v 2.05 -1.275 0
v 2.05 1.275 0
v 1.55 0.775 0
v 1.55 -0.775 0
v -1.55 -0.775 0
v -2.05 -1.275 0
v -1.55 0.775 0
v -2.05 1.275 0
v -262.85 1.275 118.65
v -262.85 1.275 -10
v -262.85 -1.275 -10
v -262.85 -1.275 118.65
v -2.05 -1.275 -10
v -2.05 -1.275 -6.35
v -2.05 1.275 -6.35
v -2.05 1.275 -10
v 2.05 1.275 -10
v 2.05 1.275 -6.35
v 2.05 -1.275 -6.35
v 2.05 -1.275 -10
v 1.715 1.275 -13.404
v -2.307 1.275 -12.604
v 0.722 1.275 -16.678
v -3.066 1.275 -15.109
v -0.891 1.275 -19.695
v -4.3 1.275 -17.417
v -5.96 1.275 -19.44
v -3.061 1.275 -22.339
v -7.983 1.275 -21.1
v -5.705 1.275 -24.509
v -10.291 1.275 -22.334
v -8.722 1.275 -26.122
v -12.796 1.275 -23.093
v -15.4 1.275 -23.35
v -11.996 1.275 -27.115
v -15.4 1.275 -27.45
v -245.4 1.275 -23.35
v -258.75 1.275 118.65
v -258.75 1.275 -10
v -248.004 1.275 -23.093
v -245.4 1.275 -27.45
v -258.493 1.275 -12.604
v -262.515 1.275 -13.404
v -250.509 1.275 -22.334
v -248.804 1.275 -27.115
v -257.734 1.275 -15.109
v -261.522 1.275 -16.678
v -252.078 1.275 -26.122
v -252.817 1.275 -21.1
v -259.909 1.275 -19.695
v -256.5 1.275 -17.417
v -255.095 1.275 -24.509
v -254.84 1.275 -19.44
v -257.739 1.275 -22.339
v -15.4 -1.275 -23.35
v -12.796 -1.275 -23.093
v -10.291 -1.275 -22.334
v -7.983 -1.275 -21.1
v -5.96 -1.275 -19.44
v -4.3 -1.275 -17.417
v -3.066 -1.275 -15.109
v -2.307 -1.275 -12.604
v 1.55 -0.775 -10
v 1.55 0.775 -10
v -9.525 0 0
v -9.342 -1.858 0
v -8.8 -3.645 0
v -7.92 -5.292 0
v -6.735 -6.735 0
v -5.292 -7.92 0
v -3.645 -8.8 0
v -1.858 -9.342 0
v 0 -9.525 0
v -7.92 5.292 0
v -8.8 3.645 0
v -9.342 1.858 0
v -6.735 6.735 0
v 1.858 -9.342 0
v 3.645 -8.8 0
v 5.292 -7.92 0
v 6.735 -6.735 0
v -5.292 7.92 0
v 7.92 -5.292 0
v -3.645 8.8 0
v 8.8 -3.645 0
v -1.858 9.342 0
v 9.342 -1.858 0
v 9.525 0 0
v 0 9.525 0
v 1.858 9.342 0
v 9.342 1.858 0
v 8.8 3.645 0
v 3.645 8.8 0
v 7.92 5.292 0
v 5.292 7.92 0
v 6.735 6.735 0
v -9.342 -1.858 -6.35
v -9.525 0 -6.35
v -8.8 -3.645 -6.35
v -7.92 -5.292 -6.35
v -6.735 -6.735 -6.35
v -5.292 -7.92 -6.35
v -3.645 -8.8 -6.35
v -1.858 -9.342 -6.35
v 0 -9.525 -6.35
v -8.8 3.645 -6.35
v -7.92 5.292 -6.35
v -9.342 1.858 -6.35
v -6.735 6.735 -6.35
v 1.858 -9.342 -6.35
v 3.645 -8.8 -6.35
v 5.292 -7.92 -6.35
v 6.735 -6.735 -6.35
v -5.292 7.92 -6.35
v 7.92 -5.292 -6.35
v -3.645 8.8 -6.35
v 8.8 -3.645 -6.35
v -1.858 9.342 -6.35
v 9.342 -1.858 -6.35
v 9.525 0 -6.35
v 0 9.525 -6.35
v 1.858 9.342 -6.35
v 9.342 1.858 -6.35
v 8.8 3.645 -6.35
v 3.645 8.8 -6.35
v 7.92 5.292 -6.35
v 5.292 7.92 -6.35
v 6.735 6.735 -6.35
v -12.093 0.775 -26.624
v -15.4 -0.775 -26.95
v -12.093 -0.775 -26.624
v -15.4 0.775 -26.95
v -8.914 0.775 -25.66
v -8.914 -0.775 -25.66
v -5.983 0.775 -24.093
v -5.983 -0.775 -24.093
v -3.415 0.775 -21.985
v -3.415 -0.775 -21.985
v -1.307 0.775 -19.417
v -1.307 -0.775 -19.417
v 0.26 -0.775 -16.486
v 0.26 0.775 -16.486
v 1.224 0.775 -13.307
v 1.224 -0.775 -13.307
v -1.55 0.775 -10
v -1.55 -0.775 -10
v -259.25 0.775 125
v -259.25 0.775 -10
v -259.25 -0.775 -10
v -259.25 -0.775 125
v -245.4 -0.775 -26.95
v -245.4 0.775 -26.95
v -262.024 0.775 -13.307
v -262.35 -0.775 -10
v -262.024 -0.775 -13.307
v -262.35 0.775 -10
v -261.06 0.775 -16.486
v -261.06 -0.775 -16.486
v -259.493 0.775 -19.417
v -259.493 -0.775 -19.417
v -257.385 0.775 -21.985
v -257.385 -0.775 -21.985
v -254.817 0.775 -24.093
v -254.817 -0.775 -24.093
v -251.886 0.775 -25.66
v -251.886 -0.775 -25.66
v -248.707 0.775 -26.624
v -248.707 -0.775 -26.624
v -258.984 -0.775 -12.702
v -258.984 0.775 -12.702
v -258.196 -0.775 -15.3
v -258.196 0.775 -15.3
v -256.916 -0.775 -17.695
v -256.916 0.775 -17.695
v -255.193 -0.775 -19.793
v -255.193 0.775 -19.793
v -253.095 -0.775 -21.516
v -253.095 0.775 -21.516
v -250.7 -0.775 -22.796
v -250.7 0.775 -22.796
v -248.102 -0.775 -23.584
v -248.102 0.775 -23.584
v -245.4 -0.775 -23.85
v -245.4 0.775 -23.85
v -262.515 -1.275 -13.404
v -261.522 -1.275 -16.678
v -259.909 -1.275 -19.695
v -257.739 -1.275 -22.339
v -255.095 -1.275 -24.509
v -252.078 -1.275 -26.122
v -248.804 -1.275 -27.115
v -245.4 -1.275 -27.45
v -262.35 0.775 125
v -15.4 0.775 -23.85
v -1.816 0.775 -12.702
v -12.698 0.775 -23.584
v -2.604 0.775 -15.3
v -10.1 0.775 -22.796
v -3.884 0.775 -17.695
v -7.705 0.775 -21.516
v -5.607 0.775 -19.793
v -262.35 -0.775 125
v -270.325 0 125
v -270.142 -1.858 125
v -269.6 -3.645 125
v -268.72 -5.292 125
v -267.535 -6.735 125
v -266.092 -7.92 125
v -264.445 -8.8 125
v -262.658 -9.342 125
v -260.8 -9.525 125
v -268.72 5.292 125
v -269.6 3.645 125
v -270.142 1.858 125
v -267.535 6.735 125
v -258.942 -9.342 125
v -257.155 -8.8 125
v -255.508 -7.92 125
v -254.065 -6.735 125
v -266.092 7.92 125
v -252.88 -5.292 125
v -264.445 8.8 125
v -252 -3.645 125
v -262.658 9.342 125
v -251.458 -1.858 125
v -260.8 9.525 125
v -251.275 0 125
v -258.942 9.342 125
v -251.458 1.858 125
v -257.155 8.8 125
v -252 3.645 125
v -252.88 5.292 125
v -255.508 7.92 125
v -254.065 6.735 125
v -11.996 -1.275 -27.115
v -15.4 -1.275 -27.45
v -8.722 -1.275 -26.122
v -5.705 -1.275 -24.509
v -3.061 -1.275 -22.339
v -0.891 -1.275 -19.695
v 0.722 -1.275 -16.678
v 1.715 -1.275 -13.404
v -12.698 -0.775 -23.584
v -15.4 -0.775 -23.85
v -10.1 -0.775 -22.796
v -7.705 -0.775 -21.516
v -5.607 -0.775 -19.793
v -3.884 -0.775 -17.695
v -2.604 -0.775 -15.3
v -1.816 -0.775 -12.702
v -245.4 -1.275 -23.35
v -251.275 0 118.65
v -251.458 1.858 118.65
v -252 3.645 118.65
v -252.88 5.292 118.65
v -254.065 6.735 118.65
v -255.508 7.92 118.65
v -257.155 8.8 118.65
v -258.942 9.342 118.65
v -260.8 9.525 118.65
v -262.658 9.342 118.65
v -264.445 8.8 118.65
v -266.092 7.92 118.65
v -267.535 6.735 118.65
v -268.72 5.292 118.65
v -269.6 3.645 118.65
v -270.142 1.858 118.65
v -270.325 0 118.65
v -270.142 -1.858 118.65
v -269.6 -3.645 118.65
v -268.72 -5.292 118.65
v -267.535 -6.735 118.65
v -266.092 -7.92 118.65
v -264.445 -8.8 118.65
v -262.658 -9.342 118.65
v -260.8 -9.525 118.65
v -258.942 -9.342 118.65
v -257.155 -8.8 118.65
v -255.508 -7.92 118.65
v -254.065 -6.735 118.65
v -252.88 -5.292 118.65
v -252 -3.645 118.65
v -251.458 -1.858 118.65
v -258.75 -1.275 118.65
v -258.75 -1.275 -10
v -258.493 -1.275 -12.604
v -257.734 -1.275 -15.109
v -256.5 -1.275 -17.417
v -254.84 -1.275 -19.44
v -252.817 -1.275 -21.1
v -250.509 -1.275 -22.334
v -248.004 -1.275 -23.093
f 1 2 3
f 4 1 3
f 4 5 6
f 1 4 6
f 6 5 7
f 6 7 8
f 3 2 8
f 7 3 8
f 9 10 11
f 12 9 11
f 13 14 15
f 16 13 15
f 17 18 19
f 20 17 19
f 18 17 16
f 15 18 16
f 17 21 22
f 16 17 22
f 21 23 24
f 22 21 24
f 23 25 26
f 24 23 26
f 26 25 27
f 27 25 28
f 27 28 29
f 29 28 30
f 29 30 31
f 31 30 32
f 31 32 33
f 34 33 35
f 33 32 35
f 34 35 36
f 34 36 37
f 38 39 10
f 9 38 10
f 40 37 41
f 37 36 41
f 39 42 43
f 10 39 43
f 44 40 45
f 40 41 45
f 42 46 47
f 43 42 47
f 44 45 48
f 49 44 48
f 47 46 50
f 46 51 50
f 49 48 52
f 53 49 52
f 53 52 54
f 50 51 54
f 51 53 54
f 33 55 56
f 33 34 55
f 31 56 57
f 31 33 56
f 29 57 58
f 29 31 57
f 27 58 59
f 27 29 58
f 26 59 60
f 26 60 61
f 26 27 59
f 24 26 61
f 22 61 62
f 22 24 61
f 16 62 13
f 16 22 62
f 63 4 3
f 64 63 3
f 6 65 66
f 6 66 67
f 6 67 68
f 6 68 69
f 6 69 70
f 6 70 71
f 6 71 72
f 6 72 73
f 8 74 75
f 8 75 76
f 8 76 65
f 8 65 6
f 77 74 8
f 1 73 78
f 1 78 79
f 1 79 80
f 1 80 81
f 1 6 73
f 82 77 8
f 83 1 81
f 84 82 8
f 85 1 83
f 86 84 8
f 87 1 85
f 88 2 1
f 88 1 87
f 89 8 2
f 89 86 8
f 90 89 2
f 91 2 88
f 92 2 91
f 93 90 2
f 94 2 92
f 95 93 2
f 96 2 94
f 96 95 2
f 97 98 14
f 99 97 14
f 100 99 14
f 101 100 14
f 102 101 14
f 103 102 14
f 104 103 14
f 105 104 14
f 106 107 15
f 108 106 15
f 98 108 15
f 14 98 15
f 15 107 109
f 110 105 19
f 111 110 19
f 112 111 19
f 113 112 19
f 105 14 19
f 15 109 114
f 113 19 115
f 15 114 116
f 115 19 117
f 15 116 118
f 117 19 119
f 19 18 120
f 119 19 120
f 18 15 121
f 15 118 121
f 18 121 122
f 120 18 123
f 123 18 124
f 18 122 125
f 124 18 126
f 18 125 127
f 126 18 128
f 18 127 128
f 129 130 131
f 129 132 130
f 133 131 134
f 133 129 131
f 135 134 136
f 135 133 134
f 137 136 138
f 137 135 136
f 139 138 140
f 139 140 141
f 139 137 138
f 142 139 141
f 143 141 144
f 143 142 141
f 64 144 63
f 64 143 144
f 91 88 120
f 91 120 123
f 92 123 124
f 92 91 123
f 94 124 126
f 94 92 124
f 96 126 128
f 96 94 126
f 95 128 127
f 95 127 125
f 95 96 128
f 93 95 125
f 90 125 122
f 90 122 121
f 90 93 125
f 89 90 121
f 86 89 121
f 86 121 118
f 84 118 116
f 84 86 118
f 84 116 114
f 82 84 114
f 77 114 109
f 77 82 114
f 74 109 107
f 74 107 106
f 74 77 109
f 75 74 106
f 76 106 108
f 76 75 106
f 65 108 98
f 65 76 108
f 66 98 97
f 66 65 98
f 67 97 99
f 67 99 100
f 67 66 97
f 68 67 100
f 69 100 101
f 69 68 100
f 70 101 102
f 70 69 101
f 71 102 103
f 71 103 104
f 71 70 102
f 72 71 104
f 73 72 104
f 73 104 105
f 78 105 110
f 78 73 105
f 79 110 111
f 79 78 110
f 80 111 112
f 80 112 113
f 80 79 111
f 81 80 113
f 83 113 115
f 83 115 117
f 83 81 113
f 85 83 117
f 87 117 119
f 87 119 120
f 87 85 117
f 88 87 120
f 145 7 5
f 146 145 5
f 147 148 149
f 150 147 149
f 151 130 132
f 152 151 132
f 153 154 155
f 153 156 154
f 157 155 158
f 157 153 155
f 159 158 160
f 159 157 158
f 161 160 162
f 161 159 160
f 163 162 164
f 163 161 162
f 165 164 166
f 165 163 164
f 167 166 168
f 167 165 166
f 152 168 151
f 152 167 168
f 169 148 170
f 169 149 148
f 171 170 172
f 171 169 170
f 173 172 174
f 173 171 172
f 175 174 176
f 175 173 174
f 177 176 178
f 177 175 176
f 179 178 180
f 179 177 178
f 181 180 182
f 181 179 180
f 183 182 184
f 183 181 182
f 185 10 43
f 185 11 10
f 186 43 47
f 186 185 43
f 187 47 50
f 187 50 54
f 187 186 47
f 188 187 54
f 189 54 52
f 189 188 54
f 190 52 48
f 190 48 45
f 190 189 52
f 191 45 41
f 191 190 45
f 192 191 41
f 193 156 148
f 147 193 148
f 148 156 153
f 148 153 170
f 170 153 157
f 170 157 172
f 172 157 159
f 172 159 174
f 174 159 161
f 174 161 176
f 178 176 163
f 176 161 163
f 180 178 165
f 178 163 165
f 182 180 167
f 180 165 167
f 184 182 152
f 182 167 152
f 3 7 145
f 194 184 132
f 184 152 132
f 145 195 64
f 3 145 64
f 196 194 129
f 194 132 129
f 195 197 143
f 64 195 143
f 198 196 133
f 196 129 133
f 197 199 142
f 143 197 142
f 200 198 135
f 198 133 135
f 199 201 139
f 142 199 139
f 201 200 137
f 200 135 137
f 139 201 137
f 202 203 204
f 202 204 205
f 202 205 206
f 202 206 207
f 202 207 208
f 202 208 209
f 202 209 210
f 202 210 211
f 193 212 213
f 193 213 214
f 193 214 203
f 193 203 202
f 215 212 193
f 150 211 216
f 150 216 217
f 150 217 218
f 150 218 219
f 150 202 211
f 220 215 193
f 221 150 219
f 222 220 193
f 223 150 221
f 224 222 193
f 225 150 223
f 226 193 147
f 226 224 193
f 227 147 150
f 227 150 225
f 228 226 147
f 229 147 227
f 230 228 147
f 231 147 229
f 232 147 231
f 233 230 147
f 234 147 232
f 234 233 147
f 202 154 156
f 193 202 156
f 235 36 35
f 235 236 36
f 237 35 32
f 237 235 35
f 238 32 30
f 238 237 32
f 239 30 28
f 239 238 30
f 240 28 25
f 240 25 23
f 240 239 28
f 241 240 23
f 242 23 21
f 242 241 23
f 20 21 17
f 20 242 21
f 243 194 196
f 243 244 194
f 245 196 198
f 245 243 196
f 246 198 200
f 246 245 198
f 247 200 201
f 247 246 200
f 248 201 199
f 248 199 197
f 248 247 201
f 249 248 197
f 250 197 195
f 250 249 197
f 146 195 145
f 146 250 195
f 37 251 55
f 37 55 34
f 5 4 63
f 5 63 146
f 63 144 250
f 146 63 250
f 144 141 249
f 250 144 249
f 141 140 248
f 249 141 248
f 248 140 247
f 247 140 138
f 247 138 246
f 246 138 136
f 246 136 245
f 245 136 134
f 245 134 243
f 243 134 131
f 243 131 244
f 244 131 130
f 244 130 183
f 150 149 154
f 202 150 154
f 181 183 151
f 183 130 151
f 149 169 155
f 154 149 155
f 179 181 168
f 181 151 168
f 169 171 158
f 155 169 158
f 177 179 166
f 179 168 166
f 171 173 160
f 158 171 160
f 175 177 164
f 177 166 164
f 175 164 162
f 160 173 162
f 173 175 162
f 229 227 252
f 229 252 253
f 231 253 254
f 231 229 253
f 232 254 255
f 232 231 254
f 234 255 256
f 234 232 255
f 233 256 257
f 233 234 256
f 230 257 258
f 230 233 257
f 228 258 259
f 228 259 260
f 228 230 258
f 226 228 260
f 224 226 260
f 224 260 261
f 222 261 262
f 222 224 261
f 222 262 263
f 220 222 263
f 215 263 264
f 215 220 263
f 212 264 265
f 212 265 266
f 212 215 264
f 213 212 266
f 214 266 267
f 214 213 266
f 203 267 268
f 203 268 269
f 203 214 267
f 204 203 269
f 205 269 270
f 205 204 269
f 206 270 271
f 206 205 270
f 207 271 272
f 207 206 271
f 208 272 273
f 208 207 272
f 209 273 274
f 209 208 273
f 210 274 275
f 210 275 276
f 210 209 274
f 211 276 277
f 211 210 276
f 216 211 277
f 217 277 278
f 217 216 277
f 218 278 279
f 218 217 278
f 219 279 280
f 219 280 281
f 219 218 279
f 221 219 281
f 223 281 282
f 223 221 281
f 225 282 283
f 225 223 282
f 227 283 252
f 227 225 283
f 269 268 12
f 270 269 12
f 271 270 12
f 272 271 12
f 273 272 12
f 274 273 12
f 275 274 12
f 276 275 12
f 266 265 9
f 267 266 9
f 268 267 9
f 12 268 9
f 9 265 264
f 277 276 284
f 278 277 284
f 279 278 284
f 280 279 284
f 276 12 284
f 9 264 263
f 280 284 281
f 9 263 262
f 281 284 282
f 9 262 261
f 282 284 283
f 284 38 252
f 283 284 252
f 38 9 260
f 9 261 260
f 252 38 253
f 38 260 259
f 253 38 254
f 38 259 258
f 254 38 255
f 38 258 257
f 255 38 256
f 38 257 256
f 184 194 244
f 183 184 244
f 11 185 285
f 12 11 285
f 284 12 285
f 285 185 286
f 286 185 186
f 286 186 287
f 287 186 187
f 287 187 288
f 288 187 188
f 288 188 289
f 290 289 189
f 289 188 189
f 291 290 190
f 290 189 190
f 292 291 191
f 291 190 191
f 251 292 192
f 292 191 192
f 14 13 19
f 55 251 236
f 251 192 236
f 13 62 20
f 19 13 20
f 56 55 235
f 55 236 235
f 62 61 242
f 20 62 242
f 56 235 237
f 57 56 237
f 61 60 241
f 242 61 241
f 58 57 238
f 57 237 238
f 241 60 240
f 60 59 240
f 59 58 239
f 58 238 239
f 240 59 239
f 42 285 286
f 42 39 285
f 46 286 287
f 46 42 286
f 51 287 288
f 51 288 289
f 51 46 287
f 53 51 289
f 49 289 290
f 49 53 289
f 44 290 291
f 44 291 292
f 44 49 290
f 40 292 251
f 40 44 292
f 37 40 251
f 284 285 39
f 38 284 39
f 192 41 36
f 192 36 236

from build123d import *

# Parameters (mm, degrees)
F3_W     = 4.1
F3_H     = 2.55
F3_W_2   = 3.1
F3_H_2   = 1.55
F3_R     = 9.525
F5_DEPTH = 6.35
F1_R     = 9.525
F1_W     = 4.1
F1_H     = 2.55
F6_DEPTH = 6.35


with BuildPart() as f4:
    # F4: sweep along a path in F0
    with BuildLine(Plane.XZ) as f4_path:
        Line((-260.8, 125), (-260.8, 0))
        Line((-260.8, 0), (-260.8, -10))
        ThreePointArc((-260.8, -10), (-256.289444, -20.889444), (-245.4, -25.4))
        Line((-245.4, -25.4), (-235.4, -25.4))
        Line((-235.4, -25.4), (-25.4, -25.4))
        Line((-25.4, -25.4), (-15.4, -25.4))
        ThreePointArc((-15.4, -25.4), (-4.510556, -20.889444), (0, -10))
        Line((0, -10), (0, 0))
    # F3 (on offset) → F4 (sweep)
    with BuildSketch(Plane.XY.offset(125)):
        with Locations((-260.8, 0)):
            Rectangle(F3_W, F3_H)
        with Locations((-260.8, 0)):
            Rectangle(F3_W_2, F3_H_2, mode=Mode.SUBTRACT)
    sweep(path=f4_path.line)

    # F3 (on offset) → F5 (join)
    with BuildSketch(Plane.XY.offset(125)):
        with Locations((-260.8, 0)):
            Circle(F3_R)
        with Locations((-260.8, 0)):
            Rectangle(F3_W, F3_H, mode=Mode.SUBTRACT)
    extrude(amount=-F5_DEPTH)

    # F1 (on Top) → F6 (join)
    with BuildSketch(Plane.XY):
        Circle(F1_R)
        Rectangle(F1_W, F1_H, mode=Mode.SUBTRACT)
    extrude(amount=-F6_DEPTH)


solid = f4.part
